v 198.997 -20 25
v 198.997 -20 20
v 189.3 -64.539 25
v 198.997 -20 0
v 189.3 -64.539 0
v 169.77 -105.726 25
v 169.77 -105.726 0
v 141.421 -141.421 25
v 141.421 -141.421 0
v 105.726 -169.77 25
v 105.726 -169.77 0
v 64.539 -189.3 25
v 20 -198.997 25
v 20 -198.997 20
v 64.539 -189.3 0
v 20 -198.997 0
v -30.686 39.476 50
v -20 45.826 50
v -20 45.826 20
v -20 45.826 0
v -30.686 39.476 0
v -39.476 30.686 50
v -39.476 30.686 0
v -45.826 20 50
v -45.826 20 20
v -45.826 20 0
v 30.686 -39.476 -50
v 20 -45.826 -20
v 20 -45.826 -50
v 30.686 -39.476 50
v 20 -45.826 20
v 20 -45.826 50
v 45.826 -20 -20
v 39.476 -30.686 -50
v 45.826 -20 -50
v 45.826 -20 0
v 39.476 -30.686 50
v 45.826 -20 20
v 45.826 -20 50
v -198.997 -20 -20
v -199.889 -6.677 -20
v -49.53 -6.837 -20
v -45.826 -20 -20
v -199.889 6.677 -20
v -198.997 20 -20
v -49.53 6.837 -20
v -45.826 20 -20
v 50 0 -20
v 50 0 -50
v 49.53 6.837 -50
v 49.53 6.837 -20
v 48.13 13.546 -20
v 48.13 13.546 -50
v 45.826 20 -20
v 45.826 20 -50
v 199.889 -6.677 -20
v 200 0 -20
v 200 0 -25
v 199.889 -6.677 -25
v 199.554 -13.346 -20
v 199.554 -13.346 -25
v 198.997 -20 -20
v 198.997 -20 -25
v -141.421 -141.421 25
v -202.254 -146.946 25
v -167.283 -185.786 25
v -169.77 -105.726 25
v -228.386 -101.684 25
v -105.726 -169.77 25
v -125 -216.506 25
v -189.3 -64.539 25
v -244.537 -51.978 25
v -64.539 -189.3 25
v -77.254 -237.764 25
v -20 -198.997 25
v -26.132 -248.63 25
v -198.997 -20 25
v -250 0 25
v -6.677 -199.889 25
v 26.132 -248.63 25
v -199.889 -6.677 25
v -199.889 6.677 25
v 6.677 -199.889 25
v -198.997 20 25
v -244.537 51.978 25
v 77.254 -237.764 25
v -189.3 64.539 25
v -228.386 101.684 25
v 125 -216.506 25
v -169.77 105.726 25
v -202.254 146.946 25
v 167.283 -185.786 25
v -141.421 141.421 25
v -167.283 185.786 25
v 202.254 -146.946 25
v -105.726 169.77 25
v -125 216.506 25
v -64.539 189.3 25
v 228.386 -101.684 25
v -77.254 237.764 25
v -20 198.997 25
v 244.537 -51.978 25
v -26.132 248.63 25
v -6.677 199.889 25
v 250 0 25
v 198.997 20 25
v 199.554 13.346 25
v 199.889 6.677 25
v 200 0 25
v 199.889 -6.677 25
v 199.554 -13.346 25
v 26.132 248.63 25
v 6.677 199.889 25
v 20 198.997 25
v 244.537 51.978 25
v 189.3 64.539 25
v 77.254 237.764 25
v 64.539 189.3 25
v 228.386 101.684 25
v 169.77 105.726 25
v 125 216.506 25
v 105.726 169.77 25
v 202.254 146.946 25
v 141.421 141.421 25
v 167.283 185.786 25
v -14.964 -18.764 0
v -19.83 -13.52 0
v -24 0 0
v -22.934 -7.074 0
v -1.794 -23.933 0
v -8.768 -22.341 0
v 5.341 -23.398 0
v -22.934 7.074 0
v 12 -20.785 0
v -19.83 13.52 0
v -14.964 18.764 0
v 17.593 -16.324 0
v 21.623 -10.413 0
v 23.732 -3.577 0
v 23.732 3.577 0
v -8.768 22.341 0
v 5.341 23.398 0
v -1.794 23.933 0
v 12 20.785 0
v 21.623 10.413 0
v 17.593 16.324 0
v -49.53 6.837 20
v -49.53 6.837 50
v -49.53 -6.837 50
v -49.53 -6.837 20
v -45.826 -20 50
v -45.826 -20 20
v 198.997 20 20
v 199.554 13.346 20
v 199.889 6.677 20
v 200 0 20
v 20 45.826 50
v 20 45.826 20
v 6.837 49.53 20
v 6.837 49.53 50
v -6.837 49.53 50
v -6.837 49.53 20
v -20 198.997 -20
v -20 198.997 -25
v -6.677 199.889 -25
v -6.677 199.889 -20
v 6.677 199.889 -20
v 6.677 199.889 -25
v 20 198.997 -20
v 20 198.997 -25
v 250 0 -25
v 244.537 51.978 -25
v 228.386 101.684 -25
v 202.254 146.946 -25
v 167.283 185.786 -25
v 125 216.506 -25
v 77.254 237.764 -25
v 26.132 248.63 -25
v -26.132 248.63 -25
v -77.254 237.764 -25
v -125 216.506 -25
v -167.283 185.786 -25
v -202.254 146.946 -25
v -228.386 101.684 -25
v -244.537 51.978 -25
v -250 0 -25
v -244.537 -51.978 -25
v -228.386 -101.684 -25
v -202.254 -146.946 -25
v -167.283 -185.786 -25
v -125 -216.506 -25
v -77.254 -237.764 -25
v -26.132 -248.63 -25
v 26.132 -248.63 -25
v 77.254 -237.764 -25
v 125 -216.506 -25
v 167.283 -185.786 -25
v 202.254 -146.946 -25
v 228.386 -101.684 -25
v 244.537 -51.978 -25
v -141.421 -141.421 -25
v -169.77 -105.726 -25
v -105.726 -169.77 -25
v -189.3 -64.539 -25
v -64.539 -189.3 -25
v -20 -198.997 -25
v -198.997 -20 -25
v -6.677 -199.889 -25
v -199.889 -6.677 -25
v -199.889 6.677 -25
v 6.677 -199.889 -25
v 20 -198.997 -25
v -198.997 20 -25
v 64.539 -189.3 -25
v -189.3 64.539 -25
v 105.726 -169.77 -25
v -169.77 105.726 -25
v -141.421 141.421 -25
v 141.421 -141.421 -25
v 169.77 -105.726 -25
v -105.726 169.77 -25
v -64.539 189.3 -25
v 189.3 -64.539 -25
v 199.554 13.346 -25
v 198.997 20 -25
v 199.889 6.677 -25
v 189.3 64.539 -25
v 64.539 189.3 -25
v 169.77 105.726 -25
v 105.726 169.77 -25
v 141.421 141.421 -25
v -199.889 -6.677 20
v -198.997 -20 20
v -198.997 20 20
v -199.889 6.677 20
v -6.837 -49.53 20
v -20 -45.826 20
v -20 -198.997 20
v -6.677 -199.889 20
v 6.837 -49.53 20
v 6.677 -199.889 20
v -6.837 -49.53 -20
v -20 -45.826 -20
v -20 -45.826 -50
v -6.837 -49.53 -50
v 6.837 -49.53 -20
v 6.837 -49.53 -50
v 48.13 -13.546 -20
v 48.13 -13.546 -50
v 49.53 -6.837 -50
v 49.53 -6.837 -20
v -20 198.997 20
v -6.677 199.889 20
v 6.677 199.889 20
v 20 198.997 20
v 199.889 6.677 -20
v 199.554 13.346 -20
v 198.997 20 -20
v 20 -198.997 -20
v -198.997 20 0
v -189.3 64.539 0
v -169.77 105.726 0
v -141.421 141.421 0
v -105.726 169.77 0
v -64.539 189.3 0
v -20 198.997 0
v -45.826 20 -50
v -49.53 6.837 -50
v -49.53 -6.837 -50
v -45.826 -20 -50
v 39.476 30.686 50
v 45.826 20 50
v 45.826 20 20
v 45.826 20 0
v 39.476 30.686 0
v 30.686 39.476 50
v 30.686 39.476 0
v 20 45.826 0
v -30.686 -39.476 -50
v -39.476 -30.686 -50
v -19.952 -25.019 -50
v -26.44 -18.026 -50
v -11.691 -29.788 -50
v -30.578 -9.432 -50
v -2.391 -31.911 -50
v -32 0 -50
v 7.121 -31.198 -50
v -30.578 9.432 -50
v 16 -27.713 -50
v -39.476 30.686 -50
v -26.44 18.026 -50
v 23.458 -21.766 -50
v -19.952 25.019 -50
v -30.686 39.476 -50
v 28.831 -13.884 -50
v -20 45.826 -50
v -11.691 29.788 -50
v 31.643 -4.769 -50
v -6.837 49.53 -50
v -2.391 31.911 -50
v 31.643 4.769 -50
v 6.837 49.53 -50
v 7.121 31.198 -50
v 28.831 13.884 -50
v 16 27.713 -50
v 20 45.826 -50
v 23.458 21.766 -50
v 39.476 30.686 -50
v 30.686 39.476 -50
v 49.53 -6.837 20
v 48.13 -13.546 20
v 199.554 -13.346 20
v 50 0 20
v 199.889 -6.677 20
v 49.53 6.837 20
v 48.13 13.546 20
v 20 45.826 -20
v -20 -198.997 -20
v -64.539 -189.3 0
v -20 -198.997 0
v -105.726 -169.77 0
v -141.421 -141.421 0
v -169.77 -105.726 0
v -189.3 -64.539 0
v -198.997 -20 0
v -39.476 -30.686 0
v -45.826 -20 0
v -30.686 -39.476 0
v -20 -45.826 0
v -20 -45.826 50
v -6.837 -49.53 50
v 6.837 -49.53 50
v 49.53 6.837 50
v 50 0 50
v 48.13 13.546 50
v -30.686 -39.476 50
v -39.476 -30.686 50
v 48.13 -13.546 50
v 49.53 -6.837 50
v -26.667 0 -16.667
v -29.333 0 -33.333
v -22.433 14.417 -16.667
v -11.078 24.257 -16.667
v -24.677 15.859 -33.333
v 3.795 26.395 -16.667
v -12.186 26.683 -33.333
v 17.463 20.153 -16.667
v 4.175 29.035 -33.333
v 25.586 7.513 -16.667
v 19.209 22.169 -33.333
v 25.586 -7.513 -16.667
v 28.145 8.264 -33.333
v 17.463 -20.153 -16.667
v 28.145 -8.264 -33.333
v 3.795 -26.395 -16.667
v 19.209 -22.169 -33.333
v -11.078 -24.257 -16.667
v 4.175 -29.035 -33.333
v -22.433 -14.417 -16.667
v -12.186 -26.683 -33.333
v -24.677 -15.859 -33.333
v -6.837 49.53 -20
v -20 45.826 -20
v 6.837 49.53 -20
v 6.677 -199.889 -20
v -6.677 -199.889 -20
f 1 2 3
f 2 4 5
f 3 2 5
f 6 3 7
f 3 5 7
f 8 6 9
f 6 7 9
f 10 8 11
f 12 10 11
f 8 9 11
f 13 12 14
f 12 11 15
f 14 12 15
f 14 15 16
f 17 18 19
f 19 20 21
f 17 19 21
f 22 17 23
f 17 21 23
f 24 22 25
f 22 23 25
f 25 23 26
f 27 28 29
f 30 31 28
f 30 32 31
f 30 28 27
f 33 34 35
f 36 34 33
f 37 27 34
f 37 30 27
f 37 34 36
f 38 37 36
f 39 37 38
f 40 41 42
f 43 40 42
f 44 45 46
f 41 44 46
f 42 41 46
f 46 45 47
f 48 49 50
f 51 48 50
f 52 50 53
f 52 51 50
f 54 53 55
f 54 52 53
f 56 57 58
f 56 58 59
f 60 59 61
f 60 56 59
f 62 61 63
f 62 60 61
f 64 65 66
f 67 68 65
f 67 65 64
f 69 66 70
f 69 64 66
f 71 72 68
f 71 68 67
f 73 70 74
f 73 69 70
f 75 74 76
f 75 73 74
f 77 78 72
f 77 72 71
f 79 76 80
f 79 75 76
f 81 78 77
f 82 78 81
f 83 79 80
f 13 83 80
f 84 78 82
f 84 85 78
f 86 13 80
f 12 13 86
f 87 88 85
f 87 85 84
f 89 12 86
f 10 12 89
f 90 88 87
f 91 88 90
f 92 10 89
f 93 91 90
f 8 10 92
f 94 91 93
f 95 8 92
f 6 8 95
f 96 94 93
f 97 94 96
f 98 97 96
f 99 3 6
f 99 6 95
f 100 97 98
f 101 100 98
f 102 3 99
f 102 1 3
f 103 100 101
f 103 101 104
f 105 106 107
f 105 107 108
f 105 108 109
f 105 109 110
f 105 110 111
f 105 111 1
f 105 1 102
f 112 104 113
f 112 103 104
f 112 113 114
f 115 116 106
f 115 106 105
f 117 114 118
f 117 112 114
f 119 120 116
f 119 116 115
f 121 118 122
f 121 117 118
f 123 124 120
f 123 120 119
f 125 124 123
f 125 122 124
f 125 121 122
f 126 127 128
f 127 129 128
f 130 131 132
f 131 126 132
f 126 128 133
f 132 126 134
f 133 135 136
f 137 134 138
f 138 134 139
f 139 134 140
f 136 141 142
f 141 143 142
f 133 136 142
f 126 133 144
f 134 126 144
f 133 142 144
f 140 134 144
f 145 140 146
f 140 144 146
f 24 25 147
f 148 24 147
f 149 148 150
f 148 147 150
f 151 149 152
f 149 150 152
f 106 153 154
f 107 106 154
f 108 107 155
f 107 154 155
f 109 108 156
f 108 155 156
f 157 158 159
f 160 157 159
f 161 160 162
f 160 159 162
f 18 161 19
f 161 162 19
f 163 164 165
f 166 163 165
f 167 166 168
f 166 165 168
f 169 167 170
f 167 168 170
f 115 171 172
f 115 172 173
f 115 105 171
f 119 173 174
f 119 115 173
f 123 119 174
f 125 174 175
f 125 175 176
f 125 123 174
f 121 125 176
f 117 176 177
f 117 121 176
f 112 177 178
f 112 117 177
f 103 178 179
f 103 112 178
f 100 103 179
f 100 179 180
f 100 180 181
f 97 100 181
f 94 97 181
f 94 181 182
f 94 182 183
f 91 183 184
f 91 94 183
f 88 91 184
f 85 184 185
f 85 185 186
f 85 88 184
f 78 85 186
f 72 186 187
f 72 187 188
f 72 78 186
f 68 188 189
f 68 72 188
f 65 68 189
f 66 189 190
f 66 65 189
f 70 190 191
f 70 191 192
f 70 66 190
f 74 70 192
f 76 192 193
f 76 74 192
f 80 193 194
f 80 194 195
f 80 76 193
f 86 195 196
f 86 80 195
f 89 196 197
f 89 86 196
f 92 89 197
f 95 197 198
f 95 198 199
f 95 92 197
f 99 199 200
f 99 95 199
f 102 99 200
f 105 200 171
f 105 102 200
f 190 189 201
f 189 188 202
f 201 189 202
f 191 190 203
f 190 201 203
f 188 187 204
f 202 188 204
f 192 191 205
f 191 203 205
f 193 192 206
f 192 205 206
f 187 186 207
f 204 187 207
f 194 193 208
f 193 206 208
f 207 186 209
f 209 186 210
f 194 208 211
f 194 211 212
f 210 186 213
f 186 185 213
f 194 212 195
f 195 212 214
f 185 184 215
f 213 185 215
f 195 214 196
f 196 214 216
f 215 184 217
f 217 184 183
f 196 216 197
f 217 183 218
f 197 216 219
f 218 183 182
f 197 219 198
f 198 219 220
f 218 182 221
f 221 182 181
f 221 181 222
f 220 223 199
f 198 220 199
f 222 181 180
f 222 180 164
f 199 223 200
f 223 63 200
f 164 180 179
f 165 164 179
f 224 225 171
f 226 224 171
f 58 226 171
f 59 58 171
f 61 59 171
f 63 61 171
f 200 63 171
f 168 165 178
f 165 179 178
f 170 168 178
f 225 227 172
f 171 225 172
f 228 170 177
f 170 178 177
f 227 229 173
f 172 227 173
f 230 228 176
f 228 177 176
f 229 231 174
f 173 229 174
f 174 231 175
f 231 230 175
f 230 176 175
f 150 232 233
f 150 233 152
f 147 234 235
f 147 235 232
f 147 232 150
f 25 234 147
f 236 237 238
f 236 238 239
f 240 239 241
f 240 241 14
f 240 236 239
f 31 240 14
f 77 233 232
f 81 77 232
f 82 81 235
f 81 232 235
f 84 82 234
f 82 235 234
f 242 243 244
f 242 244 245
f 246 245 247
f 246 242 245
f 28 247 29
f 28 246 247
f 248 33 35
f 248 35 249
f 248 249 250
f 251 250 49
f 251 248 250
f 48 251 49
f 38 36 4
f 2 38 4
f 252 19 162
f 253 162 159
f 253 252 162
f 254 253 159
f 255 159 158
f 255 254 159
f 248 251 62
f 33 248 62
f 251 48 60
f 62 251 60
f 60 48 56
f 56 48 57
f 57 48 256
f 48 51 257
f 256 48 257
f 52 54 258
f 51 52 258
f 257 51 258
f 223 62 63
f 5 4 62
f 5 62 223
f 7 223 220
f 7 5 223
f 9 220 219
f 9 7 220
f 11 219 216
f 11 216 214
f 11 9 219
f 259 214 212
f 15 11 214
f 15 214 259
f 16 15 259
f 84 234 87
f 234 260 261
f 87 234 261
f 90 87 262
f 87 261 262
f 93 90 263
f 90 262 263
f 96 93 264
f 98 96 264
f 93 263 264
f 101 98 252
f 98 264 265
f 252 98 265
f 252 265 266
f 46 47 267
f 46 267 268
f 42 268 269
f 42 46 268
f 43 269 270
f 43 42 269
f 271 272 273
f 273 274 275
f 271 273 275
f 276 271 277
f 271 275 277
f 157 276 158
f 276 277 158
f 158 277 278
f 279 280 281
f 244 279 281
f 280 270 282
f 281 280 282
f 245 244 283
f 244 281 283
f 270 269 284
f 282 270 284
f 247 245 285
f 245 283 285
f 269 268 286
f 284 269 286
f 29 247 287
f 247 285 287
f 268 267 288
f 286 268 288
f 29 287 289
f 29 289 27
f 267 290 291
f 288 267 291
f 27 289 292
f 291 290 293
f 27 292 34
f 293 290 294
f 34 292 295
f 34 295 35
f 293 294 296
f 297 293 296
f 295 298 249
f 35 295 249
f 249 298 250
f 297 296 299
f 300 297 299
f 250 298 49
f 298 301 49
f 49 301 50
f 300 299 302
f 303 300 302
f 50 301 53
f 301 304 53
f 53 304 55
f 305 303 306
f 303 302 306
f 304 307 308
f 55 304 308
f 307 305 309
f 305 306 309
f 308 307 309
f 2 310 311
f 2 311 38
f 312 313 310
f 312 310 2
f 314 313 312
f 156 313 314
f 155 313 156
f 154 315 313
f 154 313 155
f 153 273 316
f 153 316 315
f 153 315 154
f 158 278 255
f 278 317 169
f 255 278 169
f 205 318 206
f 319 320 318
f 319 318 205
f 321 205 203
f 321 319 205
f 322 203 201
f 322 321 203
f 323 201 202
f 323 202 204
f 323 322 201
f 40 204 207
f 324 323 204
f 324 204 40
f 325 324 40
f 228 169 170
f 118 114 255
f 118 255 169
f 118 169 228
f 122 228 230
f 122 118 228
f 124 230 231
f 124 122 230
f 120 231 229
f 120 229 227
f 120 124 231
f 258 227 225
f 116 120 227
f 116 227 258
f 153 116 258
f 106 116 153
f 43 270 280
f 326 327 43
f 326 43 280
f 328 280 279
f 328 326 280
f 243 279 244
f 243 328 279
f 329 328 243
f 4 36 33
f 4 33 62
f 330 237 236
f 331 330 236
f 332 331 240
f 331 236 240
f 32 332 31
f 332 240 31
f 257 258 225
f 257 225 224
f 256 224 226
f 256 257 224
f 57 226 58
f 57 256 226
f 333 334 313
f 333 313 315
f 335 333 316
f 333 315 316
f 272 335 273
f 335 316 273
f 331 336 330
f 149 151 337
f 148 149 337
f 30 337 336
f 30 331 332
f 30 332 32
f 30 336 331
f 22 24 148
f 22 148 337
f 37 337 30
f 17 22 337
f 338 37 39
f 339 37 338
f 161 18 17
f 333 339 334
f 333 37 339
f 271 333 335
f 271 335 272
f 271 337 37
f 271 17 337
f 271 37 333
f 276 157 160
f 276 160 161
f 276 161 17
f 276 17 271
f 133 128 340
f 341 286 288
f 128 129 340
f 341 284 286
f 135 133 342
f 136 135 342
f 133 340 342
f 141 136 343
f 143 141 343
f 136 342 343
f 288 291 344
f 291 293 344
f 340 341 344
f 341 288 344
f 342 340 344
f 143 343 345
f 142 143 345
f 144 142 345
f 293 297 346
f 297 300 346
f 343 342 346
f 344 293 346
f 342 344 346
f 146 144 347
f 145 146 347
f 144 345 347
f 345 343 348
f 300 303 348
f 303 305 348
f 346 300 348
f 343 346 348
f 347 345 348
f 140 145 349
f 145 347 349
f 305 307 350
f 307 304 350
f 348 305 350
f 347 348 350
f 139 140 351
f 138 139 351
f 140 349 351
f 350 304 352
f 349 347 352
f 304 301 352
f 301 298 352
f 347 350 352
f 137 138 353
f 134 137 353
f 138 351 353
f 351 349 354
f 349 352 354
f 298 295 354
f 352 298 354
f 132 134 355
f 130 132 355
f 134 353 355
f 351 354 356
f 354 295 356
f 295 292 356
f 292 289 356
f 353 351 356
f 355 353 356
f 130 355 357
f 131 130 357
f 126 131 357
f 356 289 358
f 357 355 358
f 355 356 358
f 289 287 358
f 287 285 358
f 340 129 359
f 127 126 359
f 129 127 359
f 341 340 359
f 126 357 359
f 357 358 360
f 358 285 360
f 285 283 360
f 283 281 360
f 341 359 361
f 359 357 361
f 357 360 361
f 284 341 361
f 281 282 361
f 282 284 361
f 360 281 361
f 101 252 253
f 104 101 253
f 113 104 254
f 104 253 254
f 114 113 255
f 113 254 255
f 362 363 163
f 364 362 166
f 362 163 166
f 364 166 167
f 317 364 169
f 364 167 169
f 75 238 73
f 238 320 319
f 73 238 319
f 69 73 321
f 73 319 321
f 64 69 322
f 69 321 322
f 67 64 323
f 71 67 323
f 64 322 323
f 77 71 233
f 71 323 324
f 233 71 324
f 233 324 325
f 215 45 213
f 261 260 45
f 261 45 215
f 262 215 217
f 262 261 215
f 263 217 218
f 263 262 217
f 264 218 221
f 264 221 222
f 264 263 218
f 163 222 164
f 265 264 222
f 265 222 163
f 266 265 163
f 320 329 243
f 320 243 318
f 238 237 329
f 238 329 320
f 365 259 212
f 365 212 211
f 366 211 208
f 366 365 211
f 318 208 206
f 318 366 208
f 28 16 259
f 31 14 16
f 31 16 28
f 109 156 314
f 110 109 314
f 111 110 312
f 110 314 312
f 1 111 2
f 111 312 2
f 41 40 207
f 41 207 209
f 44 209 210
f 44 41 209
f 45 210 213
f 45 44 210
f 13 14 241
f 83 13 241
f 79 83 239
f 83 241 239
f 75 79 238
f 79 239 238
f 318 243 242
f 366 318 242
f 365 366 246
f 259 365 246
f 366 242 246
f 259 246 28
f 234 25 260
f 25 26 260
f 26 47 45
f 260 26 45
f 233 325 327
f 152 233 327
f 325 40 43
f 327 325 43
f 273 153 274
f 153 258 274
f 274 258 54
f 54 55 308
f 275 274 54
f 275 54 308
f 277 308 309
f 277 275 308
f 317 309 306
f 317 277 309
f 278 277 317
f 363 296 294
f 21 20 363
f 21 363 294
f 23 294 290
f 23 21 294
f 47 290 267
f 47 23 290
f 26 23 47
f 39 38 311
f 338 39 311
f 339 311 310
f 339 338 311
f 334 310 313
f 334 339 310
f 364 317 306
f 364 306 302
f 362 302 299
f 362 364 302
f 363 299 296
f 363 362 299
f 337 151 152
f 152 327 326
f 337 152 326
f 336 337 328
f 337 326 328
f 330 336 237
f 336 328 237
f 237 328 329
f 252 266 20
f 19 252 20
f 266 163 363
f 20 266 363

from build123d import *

# Parameters (mm, degrees)
F0_R     = 250
F1_DEPTH = 25
F0_W     = 40
F0_H     = 40
F2_DEPTH = 50
F3_DEPTH = 20


with BuildPart() as f1:
    # F0 (on Top) → F1 (new body, symmetric)
    with BuildSketch(Plane.XY):
        Circle(F0_R)
        with BuildLine():
            ThreePointArc((20, 198.9974874213), (141.4213562373, 141.4213562373), (198.9974874213, 20))
            Line((198.9974874213, 20), (220.8077311516, 20))
            Line((220.8077311516, 20), (220.8077311516, -20))
            Line((220.8077311516, -20), (198.9974874213, -20))
            ThreePointArc((198.9974874213, -20), (141.4213562373, -141.4213562373), (20, -198.9974874213))
            Line((20, -198.9974874213), (20, -220.8077311516))
            Line((20, -220.8077311516), (-20, -220.8077311516))
            Line((-20, -220.8077311516), (-20, -198.9974874213))
            ThreePointArc((-20, -198.9974874213), (-141.4213562373, -141.4213562373), (-198.9974874213, -20))
            Line((-198.9974874213, -20), (-220.8077311516, -20))
            Line((-220.8077311516, -20), (-220.8077311516, 20))
            Line((-220.8077311516, 20), (-198.9974874213, 20))
            ThreePointArc((-198.9974874213, 20), (-141.4213562373, 141.4213562373), (-20, 198.9974874213))
            Line((-20, 198.9974874213), (-20, 220.8077311516))
            Line((-20, 220.8077311516), (20, 220.8077311516))
            Line((20, 220.8077311516), (20, 198.9974874213))
        make_face(mode=Mode.SUBTRACT)
        with BuildLine():
            ThreePointArc((-198.9974874213, -20), (-200, 0), (-198.9974874213, 20))
            Line((-198.9974874213, 20), (-220.8077311516, 20))
            Line((-220.8077311516, 20), (-220.8077311516, -20))
            Line((-220.8077311516, -20), (-198.9974874213, -20))
        make_face()
        with BuildLine():
            Line((20, -220.8077311516), (20, -198.9974874213))
            ThreePointArc((20, -198.9974874213), (0, -200), (-20, -198.9974874213))
            Line((-20, -198.9974874213), (-20, -220.8077311516))
            Line((-20, -220.8077311516), (20, -220.8077311516))
        make_face()
        with BuildLine():
            Line((220.8077311516, 20), (198.9974874213, 20))
            ThreePointArc((198.9974874213, 20), (199.7492146221, 10.012555012), (200, 0))
            ThreePointArc((200, 0), (199.7492146221, -10.012555012), (198.9974874213, -20))
            Line((198.9974874213, -20), (220.8077311516, -20))
            Line((220.8077311516, -20), (220.8077311516, 20))
        make_face()
        with BuildLine():
            ThreePointArc((-20, 198.9974874213), (0, 200), (20, 198.9974874213))
            Line((20, 198.9974874213), (20, 220.8077311516))
            Line((20, 220.8077311516), (-20, 220.8077311516))
            Line((-20, 220.8077311516), (-20, 198.9974874213))
        make_face()
    extrude(amount=F1_DEPTH, both=True)



with BuildPart() as f2:
    # F0 (on Top) → F2 (new body, symmetric)
    with BuildSketch(Plane.XY):
        with BuildLine():
            Line((20, 20), (45.8257569496, 20))
            ThreePointArc((45.8257569496, 20), (35.3553390593, 35.3553390593), (20, 45.8257569496))
            Line((20, 45.8257569496), (20, 20))
        make_face()
        with BuildLine():
            Line((20, 20), (20, 45.8257569496))
            ThreePointArc((20, 45.8257569496), (0, 50), (-20, 45.8257569496))
            Line((-20, 45.8257569496), (-20, 20))
            Line((-20, 20), (20, 20))
        make_face()
        with BuildLine():
            Line((-20, 20), (-20, 45.8257569496))
            ThreePointArc((-20, 45.8257569496), (-35.3553390593, 35.3553390593), (-45.8257569496, 20))
            Line((-45.8257569496, 20), (-20, 20))
        make_face()
        with BuildLine():
            Line((-20, -20), (-20, 20))
            Line((-20, 20), (-45.8257569496, 20))
            ThreePointArc((-45.8257569496, 20), (-50, 0), (-45.8257569496, -20))
            Line((-45.8257569496, -20), (-20, -20))
        make_face()
        with BuildLine():
            ThreePointArc((-45.8257569496, -20), (-35.3553390593, -35.3553390593), (-20, -45.8257569496))
            Line((-20, -45.8257569496), (-20, -20))
            Line((-20, -20), (-45.8257569496, -20))
        make_face()
        with BuildLine():
            ThreePointArc((-20, -45.8257569496), (0, -50), (20, -45.8257569496))
            Line((20, -45.8257569496), (20, -20))
            Line((20, -20), (-20, -20))
            Line((-20, -20), (-20, -45.8257569496))
        make_face()
        with BuildLine():
            ThreePointArc((20, -45.8257569496), (35.3553390593, -35.3553390593), (45.8257569496, -20))
            Line((45.8257569496, -20), (20, -20))
            Line((20, -20), (20, -45.8257569496))
        make_face()
        with BuildLine():
            ThreePointArc((45.8257569496, -20), (48.9453156465, -10.2154821845), (50, 0))
            ThreePointArc((50, 0), (48.9453156465, 10.2154821845), (45.8257569496, 20))
            Line((45.8257569496, 20), (20, 20))
            Line((20, 20), (20, -20))
            Line((20, -20), (45.8257569496, -20))
        make_face()
        with BuildLine():
            Line((-20, -20), (-20, 20))
            Line((-20, 20), (-45.8257569496, 20))
            ThreePointArc((-45.8257569496, 20), (-50, 0), (-45.8257569496, -20))
            Line((-45.8257569496, -20), (-20, -20))
        make_face()
        Rectangle(F0_W, F0_H)
        with BuildLine():
            ThreePointArc((-20, -45.8257569496), (0, -50), (20, -45.8257569496))
            Line((20, -45.8257569496), (20, -20))
            Line((20, -20), (-20, -20))
            Line((-20, -20), (-20, -45.8257569496))
        make_face()
        with BuildLine():
            ThreePointArc((45.8257569496, -20), (48.9453156465, -10.2154821845), (50, 0))
            ThreePointArc((50, 0), (48.9453156465, 10.2154821845), (45.8257569496, 20))
            Line((45.8257569496, 20), (20, 20))
            Line((20, 20), (20, -20))
            Line((20, -20), (45.8257569496, -20))
        make_face()
        with BuildLine():
            Line((20, 20), (20, 45.8257569496))
            ThreePointArc((20, 45.8257569496), (0, 50), (-20, 45.8257569496))
            Line((-20, 45.8257569496), (-20, 20))
            Line((-20, 20), (20, 20))
        make_face()
    extrude(amount=F2_DEPTH, both=True)


with BuildPart() as f1_1:
    add(f1.part)

    add(f2.part)  # F3 merges F2
    # F0 (on Top) → F3 (join, symmetric)
    with BuildSketch(Plane.XY):
        with BuildLine():
            ThreePointArc((-45.8257569496, -20), (-50, 0), (-45.8257569496, 20))
            Line((-45.8257569496, 20), (-198.9974874213, 20))
            ThreePointArc((-198.9974874213, 20), (-200, 0), (-198.9974874213, -20))
            Line((-198.9974874213, -20), (-45.8257569496, -20))
        make_face()
        with BuildLine():
            ThreePointArc((-20, 45.8257569496), (0, 50), (20, 45.8257569496))
            Line((20, 45.8257569496), (20, 198.9974874213))
            ThreePointArc((20, 198.9974874213), (0, 200), (-20, 198.9974874213))
            Line((-20, 198.9974874213), (-20, 45.8257569496))
        make_face()
        with BuildLine():
            ThreePointArc((45.8257569496, 20), (48.9453156465, 10.2154821845), (50, 0))
            ThreePointArc((50, 0), (48.9453156465, -10.2154821845), (45.8257569496, -20))
            Line((45.8257569496, -20), (198.9974874213, -20))
            ThreePointArc((198.9974874213, -20), (199.7492146221, -10.012555012), (200, 0))
            ThreePointArc((200, 0), (199.7492146221, 10.012555012), (198.9974874213, 20))
            Line((198.9974874213, 20), (45.8257569496, 20))
        make_face()
        with BuildLine():
            Line((20, -198.9974874213), (20, -45.8257569496))
            ThreePointArc((20, -45.8257569496), (0, -50), (-20, -45.8257569496))
            Line((-20, -45.8257569496), (-20, -198.9974874213))
            ThreePointArc((-20, -198.9974874213), (0, -200), (20, -198.9974874213))
        make_face()
    extrude(amount=F3_DEPTH, both=True)

    # F4 (on Front) → F5 (revolve, cut)
    with BuildSketch(Plane.XZ):
        Polygon((0, -50), (0, 0), (-24, 0), (-32, -50), align=None)
    revolve(axis=Axis((0, 0, -25), (0, 0, -1)), mode=Mode.SUBTRACT)


solid = f1_1.part
